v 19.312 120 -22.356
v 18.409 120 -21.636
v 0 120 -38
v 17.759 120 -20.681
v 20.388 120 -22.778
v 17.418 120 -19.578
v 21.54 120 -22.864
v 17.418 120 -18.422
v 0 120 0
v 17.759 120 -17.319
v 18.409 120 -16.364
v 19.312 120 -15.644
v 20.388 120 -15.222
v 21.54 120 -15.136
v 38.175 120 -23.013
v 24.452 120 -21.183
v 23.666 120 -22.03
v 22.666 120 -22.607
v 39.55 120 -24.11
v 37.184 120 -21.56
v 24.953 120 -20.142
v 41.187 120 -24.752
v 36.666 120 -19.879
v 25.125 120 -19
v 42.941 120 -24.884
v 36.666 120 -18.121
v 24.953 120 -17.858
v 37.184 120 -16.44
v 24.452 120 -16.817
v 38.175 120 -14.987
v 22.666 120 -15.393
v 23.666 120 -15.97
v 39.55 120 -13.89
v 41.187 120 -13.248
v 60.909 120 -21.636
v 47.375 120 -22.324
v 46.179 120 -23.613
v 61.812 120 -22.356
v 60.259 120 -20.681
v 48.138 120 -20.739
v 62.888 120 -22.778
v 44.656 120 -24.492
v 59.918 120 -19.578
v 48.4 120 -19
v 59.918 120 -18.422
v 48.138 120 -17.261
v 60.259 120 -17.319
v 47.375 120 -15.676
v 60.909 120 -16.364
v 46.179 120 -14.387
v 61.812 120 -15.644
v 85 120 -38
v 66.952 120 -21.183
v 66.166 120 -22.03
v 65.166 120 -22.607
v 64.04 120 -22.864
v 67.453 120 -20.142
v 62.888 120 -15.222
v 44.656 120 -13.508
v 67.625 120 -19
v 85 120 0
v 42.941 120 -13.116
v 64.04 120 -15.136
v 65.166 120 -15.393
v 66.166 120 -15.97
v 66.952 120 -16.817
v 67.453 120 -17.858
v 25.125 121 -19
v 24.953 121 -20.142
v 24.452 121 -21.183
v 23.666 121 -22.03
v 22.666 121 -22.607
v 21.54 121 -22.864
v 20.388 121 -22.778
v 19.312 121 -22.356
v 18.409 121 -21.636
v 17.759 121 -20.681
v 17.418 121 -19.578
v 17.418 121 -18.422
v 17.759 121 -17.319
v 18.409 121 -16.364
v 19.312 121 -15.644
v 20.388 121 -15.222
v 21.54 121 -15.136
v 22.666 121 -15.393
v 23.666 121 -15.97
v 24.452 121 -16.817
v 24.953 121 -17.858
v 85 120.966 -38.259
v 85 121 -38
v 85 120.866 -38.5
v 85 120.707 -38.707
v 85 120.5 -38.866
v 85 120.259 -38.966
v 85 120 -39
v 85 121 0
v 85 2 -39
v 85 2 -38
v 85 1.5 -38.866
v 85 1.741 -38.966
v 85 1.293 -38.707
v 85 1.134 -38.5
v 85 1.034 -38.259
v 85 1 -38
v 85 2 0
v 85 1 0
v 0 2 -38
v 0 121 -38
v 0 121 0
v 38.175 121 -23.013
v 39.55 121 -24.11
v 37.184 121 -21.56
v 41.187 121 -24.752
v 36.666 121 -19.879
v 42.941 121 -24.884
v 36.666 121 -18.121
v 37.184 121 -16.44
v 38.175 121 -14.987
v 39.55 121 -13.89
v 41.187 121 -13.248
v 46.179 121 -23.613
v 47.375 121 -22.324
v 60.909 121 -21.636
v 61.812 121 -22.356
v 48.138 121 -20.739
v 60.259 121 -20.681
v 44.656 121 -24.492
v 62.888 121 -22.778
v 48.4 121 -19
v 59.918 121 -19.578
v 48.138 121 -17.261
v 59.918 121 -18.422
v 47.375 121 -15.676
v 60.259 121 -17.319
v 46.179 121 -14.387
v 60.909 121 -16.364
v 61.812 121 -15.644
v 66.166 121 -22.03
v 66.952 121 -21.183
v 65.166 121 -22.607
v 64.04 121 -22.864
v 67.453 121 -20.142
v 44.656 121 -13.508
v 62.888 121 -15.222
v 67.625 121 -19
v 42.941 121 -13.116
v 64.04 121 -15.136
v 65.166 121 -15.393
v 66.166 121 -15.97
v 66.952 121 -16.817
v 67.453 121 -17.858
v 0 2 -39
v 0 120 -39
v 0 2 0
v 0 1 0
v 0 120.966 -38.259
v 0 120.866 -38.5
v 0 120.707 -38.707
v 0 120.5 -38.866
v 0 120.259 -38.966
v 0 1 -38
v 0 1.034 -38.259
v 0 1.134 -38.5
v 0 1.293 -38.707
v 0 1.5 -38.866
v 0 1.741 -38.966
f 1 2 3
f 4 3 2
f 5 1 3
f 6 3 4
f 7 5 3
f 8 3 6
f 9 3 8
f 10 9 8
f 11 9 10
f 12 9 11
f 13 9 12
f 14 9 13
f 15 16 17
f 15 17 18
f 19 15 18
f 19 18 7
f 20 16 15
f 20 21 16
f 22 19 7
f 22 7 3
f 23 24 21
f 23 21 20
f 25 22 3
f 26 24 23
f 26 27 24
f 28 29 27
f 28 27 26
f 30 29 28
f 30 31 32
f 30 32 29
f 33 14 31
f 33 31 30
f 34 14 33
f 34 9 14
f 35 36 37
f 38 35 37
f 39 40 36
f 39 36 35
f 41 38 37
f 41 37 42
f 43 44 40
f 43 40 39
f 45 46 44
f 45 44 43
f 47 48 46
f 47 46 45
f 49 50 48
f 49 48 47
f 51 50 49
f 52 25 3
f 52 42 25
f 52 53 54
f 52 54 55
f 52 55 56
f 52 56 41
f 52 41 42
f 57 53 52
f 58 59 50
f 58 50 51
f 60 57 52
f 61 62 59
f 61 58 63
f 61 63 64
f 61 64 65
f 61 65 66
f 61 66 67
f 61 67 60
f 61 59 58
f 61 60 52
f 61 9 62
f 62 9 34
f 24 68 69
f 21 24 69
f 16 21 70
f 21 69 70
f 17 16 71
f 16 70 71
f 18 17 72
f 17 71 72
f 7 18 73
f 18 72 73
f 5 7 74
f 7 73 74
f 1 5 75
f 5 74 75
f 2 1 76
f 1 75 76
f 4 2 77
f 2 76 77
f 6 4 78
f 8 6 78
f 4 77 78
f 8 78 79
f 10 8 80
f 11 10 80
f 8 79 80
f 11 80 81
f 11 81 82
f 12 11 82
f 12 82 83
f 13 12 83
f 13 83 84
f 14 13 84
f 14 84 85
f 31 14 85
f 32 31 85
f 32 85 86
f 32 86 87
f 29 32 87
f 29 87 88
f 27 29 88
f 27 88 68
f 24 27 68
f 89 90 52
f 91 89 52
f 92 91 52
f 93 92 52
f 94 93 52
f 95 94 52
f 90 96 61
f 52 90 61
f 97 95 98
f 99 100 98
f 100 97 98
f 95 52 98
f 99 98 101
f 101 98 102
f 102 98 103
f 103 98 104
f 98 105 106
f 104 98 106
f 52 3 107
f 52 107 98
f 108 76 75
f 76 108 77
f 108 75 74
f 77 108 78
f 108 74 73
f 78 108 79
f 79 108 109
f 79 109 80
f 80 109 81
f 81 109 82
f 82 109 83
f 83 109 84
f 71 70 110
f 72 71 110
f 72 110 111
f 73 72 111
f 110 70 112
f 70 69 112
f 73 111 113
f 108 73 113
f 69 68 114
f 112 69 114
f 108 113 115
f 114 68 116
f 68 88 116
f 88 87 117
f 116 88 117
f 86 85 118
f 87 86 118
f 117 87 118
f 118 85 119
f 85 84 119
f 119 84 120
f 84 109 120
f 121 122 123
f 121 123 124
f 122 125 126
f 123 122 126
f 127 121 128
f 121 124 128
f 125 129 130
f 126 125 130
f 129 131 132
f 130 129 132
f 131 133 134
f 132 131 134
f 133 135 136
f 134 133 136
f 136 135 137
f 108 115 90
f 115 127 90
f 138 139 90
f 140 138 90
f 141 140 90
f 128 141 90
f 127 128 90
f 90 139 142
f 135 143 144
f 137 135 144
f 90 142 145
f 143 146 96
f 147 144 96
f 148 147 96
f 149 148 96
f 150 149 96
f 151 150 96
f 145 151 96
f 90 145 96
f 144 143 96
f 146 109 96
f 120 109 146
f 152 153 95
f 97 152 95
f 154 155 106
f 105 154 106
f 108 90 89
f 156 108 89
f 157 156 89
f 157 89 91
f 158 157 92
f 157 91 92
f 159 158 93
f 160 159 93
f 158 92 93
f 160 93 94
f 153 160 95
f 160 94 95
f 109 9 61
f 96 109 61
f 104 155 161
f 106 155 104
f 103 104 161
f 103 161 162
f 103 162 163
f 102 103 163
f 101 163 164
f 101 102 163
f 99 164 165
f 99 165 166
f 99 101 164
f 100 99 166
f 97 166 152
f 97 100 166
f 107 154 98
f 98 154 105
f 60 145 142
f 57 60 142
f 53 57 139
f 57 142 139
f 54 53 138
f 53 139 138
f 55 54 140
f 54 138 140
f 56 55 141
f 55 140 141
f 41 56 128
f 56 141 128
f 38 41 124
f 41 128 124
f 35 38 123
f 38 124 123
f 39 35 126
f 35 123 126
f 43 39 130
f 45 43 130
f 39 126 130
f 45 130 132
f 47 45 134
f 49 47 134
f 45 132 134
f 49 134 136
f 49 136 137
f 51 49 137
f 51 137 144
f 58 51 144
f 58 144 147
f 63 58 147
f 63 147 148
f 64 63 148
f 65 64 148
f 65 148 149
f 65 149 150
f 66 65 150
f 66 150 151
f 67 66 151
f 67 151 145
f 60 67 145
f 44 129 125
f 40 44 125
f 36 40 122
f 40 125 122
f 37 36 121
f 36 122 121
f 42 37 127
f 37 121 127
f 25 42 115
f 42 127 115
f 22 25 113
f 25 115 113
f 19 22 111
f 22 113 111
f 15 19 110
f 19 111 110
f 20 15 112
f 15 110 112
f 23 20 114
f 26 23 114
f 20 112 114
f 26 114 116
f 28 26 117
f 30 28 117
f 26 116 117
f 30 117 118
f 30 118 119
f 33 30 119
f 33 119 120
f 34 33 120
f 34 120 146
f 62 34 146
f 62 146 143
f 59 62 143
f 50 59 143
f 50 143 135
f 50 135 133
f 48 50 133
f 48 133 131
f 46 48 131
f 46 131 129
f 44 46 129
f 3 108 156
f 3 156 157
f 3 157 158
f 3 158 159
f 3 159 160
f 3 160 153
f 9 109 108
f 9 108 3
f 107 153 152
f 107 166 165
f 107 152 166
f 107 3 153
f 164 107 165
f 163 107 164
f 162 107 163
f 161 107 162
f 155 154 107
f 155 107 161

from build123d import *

# Parameters (mm, degrees)
SKETCH002_W             = 85
SKETCH002_H             = 118
PAD001_DEPTH            = 38
THICKNESS001_T          = 1
SKETCH008_R             = 3.875
SKETCH008_R_2           = 5.9
POCKET_DEPTH            = 5
BODY001_PLACEMENT_ANGLE = 180


with BuildPart() as part:
    # Sketch002 → Pad001 (new body)
    with BuildSketch(Plane.XY):
        with Locations((42.5, 59)):
            Rectangle(SKETCH002_W, SKETCH002_H)
    extrude(amount=PAD001_DEPTH)

    # Thickness001
    thickness001_openings = [part.faces().sort_by_distance(p)[0] for p in [
        (85, 59, 19),
        (42.5, 59, 0),
        (0, 59, 19),
    ]]
    offset(amount=THICKNESS001_T, openings=thickness001_openings)

    # Sketch008 (on Face10 of Thickness001) → Pocket (cut)
    with BuildSketch(Plane.XZ.offset(1)):
        with Locations((63.75, 19)):
            Circle(SKETCH008_R)
        with Locations((21.25, 19)):
            Circle(SKETCH008_R)
        with Locations((42.5, 19)):
            Circle(SKETCH008_R_2)
    extrude(amount=-POCKET_DEPTH, mode=Mode.SUBTRACT)


with BuildPart() as part_1:
    # Body001 placement: moved
    add(part.part.moved(Location((0, 120, 0))).rotate(Axis((0, 120, 0), (1, 0, 0)), BODY001_PLACEMENT_ANGLE))


solid = part_1.part
